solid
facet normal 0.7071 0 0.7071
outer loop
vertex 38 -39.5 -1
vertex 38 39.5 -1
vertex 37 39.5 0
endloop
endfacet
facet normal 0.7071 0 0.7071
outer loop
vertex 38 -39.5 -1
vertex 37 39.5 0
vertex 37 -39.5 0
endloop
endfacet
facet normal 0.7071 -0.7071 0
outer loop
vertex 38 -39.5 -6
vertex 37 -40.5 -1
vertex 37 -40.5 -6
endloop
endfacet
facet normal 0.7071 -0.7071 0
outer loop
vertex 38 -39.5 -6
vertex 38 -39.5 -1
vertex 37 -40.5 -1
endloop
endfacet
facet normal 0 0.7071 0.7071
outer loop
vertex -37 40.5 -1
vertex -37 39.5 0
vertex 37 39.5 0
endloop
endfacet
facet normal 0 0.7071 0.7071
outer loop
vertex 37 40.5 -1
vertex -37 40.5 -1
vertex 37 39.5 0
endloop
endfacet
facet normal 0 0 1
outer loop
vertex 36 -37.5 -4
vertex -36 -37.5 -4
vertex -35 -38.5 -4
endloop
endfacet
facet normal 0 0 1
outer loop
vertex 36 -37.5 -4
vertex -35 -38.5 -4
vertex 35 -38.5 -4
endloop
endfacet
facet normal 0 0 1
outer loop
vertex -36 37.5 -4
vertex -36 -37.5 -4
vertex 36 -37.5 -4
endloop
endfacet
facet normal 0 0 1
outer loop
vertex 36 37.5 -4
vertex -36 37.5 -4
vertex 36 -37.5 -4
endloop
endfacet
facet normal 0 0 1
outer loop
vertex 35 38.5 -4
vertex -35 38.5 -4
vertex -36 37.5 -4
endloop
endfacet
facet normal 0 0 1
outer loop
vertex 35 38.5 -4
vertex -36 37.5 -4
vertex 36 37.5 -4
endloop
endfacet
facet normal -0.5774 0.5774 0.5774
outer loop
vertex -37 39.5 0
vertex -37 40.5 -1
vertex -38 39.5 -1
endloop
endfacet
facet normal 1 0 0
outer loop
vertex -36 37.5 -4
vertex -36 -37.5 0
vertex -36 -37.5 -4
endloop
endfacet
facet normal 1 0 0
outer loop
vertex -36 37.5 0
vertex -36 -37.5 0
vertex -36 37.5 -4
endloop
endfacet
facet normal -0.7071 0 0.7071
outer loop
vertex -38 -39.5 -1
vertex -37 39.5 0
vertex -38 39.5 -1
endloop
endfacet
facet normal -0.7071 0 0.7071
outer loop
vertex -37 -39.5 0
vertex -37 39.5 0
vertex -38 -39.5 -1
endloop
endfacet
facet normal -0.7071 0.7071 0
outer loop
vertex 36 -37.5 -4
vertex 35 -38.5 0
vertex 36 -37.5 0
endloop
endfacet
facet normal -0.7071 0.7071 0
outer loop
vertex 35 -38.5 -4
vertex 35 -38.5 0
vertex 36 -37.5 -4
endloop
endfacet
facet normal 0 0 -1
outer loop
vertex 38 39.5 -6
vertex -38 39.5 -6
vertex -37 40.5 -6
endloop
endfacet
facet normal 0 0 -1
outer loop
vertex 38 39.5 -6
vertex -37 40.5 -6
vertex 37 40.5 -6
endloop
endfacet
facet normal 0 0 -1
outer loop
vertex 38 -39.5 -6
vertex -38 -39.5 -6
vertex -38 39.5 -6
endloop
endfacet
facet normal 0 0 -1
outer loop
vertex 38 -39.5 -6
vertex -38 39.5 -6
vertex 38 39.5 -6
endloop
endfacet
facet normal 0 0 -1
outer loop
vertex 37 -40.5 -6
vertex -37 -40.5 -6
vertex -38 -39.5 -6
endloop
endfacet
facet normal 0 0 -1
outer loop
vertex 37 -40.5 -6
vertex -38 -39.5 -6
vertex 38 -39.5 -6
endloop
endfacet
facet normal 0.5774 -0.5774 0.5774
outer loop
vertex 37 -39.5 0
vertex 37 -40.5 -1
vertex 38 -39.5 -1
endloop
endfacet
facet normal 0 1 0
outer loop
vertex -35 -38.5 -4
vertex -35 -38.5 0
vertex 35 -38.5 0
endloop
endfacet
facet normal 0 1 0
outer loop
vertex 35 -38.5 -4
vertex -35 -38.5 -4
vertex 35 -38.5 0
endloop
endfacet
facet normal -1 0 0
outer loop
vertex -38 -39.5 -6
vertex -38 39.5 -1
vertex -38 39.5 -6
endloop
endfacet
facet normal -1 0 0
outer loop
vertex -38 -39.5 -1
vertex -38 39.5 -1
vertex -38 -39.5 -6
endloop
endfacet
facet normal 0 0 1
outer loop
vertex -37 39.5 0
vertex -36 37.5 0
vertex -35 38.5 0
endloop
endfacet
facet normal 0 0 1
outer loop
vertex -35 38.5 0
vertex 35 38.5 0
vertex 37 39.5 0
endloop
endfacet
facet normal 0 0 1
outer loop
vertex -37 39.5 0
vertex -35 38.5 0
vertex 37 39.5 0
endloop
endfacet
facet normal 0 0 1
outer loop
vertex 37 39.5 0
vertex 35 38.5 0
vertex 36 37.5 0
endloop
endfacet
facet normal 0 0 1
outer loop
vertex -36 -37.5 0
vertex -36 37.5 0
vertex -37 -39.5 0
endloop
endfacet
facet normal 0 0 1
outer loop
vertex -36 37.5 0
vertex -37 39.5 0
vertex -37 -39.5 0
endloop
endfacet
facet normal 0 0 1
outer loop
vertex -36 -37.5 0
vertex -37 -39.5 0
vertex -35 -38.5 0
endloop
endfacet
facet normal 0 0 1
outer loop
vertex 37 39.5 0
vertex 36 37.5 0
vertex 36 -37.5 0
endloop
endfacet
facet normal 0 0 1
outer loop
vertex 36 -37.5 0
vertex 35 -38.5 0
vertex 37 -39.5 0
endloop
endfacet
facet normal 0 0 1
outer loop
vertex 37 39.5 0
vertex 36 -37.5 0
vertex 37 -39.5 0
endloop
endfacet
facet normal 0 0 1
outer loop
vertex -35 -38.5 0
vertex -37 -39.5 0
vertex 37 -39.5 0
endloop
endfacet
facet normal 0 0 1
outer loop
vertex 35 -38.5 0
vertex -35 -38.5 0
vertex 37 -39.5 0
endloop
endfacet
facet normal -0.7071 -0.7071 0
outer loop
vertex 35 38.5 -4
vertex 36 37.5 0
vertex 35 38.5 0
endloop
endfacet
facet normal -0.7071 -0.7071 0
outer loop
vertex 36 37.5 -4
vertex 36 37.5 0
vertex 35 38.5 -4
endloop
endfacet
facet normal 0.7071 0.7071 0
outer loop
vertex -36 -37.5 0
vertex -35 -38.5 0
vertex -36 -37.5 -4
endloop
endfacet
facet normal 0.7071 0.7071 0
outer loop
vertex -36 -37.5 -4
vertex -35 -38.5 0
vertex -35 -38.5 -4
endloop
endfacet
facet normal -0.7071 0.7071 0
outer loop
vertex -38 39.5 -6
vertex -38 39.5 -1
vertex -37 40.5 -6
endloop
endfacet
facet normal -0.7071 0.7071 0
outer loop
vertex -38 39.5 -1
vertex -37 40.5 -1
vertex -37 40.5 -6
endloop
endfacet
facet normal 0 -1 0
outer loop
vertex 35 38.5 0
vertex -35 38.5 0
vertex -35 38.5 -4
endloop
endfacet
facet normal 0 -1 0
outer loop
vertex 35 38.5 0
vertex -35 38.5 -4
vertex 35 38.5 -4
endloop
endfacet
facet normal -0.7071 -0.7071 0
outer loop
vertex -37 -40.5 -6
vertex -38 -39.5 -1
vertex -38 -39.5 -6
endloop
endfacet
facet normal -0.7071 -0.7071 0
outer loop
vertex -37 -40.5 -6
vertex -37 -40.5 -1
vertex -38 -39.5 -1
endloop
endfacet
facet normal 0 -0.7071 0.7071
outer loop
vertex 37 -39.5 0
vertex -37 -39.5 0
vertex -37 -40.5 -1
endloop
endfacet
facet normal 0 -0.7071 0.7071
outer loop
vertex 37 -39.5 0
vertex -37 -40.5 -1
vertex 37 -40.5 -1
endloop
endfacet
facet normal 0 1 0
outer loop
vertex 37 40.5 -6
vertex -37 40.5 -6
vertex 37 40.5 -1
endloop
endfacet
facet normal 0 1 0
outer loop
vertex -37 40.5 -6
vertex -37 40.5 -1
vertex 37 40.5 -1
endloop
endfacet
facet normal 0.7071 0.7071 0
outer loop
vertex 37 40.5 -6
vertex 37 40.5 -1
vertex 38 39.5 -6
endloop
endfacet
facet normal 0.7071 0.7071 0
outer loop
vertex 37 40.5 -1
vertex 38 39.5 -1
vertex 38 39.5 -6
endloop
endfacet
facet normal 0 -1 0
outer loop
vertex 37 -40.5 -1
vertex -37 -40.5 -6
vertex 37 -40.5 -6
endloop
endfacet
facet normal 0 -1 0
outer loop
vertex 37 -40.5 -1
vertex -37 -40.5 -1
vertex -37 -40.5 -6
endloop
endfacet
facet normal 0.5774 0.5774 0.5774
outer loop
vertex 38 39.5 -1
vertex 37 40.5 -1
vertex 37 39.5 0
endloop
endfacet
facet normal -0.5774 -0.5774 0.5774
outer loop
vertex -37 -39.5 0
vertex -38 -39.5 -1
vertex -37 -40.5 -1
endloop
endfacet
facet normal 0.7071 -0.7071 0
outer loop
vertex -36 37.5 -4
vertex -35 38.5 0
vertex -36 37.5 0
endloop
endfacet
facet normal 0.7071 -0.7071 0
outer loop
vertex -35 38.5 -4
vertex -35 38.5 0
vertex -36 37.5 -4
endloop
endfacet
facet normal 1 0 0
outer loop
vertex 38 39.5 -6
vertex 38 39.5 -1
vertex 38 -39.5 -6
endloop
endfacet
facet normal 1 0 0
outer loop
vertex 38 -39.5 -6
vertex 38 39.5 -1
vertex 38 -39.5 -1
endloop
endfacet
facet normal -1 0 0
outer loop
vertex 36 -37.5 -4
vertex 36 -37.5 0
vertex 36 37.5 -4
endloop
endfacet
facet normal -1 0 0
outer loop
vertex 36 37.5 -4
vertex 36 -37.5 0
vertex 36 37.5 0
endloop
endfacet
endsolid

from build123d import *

# Parameters (mm, degrees)
SKETCH005_W     = 76
SKETCH005_H     = 81
PAD001_DEPTH    = 6
SKETCH006_W     = 72
SKETCH006_H     = 77
POCKET004_DEPTH = 4
CHAMFER002_SIZE = 1


with BuildPart() as part:
    # Sketch005 (on Face1 of CopyChamfer001) → Pad001 (new body)
    with BuildSketch(Plane(origin=(0, 0, 0), x_dir=(1, 0, 0), z_dir=(0, 0, -1))):
        Rectangle(SKETCH005_W, SKETCH005_H)
    extrude(amount=PAD001_DEPTH)

    # Sketch006 (on Face5 of Pad001) → Pocket004 (cut)
    with BuildSketch(Plane.XY):
        Rectangle(SKETCH006_W, SKETCH006_H)
    extrude(amount=-POCKET004_DEPTH, mode=Mode.SUBTRACT)

    # Chamfer002
    chamfer002_edges = [part.edges().sort_by_distance(p)[0] for p in [
        (36, -38.5, -2),
        (-36, -38.5, -2),
        (-36, 38.5, -2),
        (36, 38.5, -2),
        (38, -40.5, -3),
        (-38, -40.5, -3),
        (38, 40.5, -3),
        (-38, 40.5, -3),
        (0, 40.5, 0),
        (-38, 0, 0),
        (0, -40.5, 0),
        (38, 0, 0),
    ]]
    chamfer(chamfer002_edges, length=CHAMFER002_SIZE)


solid = part.part
